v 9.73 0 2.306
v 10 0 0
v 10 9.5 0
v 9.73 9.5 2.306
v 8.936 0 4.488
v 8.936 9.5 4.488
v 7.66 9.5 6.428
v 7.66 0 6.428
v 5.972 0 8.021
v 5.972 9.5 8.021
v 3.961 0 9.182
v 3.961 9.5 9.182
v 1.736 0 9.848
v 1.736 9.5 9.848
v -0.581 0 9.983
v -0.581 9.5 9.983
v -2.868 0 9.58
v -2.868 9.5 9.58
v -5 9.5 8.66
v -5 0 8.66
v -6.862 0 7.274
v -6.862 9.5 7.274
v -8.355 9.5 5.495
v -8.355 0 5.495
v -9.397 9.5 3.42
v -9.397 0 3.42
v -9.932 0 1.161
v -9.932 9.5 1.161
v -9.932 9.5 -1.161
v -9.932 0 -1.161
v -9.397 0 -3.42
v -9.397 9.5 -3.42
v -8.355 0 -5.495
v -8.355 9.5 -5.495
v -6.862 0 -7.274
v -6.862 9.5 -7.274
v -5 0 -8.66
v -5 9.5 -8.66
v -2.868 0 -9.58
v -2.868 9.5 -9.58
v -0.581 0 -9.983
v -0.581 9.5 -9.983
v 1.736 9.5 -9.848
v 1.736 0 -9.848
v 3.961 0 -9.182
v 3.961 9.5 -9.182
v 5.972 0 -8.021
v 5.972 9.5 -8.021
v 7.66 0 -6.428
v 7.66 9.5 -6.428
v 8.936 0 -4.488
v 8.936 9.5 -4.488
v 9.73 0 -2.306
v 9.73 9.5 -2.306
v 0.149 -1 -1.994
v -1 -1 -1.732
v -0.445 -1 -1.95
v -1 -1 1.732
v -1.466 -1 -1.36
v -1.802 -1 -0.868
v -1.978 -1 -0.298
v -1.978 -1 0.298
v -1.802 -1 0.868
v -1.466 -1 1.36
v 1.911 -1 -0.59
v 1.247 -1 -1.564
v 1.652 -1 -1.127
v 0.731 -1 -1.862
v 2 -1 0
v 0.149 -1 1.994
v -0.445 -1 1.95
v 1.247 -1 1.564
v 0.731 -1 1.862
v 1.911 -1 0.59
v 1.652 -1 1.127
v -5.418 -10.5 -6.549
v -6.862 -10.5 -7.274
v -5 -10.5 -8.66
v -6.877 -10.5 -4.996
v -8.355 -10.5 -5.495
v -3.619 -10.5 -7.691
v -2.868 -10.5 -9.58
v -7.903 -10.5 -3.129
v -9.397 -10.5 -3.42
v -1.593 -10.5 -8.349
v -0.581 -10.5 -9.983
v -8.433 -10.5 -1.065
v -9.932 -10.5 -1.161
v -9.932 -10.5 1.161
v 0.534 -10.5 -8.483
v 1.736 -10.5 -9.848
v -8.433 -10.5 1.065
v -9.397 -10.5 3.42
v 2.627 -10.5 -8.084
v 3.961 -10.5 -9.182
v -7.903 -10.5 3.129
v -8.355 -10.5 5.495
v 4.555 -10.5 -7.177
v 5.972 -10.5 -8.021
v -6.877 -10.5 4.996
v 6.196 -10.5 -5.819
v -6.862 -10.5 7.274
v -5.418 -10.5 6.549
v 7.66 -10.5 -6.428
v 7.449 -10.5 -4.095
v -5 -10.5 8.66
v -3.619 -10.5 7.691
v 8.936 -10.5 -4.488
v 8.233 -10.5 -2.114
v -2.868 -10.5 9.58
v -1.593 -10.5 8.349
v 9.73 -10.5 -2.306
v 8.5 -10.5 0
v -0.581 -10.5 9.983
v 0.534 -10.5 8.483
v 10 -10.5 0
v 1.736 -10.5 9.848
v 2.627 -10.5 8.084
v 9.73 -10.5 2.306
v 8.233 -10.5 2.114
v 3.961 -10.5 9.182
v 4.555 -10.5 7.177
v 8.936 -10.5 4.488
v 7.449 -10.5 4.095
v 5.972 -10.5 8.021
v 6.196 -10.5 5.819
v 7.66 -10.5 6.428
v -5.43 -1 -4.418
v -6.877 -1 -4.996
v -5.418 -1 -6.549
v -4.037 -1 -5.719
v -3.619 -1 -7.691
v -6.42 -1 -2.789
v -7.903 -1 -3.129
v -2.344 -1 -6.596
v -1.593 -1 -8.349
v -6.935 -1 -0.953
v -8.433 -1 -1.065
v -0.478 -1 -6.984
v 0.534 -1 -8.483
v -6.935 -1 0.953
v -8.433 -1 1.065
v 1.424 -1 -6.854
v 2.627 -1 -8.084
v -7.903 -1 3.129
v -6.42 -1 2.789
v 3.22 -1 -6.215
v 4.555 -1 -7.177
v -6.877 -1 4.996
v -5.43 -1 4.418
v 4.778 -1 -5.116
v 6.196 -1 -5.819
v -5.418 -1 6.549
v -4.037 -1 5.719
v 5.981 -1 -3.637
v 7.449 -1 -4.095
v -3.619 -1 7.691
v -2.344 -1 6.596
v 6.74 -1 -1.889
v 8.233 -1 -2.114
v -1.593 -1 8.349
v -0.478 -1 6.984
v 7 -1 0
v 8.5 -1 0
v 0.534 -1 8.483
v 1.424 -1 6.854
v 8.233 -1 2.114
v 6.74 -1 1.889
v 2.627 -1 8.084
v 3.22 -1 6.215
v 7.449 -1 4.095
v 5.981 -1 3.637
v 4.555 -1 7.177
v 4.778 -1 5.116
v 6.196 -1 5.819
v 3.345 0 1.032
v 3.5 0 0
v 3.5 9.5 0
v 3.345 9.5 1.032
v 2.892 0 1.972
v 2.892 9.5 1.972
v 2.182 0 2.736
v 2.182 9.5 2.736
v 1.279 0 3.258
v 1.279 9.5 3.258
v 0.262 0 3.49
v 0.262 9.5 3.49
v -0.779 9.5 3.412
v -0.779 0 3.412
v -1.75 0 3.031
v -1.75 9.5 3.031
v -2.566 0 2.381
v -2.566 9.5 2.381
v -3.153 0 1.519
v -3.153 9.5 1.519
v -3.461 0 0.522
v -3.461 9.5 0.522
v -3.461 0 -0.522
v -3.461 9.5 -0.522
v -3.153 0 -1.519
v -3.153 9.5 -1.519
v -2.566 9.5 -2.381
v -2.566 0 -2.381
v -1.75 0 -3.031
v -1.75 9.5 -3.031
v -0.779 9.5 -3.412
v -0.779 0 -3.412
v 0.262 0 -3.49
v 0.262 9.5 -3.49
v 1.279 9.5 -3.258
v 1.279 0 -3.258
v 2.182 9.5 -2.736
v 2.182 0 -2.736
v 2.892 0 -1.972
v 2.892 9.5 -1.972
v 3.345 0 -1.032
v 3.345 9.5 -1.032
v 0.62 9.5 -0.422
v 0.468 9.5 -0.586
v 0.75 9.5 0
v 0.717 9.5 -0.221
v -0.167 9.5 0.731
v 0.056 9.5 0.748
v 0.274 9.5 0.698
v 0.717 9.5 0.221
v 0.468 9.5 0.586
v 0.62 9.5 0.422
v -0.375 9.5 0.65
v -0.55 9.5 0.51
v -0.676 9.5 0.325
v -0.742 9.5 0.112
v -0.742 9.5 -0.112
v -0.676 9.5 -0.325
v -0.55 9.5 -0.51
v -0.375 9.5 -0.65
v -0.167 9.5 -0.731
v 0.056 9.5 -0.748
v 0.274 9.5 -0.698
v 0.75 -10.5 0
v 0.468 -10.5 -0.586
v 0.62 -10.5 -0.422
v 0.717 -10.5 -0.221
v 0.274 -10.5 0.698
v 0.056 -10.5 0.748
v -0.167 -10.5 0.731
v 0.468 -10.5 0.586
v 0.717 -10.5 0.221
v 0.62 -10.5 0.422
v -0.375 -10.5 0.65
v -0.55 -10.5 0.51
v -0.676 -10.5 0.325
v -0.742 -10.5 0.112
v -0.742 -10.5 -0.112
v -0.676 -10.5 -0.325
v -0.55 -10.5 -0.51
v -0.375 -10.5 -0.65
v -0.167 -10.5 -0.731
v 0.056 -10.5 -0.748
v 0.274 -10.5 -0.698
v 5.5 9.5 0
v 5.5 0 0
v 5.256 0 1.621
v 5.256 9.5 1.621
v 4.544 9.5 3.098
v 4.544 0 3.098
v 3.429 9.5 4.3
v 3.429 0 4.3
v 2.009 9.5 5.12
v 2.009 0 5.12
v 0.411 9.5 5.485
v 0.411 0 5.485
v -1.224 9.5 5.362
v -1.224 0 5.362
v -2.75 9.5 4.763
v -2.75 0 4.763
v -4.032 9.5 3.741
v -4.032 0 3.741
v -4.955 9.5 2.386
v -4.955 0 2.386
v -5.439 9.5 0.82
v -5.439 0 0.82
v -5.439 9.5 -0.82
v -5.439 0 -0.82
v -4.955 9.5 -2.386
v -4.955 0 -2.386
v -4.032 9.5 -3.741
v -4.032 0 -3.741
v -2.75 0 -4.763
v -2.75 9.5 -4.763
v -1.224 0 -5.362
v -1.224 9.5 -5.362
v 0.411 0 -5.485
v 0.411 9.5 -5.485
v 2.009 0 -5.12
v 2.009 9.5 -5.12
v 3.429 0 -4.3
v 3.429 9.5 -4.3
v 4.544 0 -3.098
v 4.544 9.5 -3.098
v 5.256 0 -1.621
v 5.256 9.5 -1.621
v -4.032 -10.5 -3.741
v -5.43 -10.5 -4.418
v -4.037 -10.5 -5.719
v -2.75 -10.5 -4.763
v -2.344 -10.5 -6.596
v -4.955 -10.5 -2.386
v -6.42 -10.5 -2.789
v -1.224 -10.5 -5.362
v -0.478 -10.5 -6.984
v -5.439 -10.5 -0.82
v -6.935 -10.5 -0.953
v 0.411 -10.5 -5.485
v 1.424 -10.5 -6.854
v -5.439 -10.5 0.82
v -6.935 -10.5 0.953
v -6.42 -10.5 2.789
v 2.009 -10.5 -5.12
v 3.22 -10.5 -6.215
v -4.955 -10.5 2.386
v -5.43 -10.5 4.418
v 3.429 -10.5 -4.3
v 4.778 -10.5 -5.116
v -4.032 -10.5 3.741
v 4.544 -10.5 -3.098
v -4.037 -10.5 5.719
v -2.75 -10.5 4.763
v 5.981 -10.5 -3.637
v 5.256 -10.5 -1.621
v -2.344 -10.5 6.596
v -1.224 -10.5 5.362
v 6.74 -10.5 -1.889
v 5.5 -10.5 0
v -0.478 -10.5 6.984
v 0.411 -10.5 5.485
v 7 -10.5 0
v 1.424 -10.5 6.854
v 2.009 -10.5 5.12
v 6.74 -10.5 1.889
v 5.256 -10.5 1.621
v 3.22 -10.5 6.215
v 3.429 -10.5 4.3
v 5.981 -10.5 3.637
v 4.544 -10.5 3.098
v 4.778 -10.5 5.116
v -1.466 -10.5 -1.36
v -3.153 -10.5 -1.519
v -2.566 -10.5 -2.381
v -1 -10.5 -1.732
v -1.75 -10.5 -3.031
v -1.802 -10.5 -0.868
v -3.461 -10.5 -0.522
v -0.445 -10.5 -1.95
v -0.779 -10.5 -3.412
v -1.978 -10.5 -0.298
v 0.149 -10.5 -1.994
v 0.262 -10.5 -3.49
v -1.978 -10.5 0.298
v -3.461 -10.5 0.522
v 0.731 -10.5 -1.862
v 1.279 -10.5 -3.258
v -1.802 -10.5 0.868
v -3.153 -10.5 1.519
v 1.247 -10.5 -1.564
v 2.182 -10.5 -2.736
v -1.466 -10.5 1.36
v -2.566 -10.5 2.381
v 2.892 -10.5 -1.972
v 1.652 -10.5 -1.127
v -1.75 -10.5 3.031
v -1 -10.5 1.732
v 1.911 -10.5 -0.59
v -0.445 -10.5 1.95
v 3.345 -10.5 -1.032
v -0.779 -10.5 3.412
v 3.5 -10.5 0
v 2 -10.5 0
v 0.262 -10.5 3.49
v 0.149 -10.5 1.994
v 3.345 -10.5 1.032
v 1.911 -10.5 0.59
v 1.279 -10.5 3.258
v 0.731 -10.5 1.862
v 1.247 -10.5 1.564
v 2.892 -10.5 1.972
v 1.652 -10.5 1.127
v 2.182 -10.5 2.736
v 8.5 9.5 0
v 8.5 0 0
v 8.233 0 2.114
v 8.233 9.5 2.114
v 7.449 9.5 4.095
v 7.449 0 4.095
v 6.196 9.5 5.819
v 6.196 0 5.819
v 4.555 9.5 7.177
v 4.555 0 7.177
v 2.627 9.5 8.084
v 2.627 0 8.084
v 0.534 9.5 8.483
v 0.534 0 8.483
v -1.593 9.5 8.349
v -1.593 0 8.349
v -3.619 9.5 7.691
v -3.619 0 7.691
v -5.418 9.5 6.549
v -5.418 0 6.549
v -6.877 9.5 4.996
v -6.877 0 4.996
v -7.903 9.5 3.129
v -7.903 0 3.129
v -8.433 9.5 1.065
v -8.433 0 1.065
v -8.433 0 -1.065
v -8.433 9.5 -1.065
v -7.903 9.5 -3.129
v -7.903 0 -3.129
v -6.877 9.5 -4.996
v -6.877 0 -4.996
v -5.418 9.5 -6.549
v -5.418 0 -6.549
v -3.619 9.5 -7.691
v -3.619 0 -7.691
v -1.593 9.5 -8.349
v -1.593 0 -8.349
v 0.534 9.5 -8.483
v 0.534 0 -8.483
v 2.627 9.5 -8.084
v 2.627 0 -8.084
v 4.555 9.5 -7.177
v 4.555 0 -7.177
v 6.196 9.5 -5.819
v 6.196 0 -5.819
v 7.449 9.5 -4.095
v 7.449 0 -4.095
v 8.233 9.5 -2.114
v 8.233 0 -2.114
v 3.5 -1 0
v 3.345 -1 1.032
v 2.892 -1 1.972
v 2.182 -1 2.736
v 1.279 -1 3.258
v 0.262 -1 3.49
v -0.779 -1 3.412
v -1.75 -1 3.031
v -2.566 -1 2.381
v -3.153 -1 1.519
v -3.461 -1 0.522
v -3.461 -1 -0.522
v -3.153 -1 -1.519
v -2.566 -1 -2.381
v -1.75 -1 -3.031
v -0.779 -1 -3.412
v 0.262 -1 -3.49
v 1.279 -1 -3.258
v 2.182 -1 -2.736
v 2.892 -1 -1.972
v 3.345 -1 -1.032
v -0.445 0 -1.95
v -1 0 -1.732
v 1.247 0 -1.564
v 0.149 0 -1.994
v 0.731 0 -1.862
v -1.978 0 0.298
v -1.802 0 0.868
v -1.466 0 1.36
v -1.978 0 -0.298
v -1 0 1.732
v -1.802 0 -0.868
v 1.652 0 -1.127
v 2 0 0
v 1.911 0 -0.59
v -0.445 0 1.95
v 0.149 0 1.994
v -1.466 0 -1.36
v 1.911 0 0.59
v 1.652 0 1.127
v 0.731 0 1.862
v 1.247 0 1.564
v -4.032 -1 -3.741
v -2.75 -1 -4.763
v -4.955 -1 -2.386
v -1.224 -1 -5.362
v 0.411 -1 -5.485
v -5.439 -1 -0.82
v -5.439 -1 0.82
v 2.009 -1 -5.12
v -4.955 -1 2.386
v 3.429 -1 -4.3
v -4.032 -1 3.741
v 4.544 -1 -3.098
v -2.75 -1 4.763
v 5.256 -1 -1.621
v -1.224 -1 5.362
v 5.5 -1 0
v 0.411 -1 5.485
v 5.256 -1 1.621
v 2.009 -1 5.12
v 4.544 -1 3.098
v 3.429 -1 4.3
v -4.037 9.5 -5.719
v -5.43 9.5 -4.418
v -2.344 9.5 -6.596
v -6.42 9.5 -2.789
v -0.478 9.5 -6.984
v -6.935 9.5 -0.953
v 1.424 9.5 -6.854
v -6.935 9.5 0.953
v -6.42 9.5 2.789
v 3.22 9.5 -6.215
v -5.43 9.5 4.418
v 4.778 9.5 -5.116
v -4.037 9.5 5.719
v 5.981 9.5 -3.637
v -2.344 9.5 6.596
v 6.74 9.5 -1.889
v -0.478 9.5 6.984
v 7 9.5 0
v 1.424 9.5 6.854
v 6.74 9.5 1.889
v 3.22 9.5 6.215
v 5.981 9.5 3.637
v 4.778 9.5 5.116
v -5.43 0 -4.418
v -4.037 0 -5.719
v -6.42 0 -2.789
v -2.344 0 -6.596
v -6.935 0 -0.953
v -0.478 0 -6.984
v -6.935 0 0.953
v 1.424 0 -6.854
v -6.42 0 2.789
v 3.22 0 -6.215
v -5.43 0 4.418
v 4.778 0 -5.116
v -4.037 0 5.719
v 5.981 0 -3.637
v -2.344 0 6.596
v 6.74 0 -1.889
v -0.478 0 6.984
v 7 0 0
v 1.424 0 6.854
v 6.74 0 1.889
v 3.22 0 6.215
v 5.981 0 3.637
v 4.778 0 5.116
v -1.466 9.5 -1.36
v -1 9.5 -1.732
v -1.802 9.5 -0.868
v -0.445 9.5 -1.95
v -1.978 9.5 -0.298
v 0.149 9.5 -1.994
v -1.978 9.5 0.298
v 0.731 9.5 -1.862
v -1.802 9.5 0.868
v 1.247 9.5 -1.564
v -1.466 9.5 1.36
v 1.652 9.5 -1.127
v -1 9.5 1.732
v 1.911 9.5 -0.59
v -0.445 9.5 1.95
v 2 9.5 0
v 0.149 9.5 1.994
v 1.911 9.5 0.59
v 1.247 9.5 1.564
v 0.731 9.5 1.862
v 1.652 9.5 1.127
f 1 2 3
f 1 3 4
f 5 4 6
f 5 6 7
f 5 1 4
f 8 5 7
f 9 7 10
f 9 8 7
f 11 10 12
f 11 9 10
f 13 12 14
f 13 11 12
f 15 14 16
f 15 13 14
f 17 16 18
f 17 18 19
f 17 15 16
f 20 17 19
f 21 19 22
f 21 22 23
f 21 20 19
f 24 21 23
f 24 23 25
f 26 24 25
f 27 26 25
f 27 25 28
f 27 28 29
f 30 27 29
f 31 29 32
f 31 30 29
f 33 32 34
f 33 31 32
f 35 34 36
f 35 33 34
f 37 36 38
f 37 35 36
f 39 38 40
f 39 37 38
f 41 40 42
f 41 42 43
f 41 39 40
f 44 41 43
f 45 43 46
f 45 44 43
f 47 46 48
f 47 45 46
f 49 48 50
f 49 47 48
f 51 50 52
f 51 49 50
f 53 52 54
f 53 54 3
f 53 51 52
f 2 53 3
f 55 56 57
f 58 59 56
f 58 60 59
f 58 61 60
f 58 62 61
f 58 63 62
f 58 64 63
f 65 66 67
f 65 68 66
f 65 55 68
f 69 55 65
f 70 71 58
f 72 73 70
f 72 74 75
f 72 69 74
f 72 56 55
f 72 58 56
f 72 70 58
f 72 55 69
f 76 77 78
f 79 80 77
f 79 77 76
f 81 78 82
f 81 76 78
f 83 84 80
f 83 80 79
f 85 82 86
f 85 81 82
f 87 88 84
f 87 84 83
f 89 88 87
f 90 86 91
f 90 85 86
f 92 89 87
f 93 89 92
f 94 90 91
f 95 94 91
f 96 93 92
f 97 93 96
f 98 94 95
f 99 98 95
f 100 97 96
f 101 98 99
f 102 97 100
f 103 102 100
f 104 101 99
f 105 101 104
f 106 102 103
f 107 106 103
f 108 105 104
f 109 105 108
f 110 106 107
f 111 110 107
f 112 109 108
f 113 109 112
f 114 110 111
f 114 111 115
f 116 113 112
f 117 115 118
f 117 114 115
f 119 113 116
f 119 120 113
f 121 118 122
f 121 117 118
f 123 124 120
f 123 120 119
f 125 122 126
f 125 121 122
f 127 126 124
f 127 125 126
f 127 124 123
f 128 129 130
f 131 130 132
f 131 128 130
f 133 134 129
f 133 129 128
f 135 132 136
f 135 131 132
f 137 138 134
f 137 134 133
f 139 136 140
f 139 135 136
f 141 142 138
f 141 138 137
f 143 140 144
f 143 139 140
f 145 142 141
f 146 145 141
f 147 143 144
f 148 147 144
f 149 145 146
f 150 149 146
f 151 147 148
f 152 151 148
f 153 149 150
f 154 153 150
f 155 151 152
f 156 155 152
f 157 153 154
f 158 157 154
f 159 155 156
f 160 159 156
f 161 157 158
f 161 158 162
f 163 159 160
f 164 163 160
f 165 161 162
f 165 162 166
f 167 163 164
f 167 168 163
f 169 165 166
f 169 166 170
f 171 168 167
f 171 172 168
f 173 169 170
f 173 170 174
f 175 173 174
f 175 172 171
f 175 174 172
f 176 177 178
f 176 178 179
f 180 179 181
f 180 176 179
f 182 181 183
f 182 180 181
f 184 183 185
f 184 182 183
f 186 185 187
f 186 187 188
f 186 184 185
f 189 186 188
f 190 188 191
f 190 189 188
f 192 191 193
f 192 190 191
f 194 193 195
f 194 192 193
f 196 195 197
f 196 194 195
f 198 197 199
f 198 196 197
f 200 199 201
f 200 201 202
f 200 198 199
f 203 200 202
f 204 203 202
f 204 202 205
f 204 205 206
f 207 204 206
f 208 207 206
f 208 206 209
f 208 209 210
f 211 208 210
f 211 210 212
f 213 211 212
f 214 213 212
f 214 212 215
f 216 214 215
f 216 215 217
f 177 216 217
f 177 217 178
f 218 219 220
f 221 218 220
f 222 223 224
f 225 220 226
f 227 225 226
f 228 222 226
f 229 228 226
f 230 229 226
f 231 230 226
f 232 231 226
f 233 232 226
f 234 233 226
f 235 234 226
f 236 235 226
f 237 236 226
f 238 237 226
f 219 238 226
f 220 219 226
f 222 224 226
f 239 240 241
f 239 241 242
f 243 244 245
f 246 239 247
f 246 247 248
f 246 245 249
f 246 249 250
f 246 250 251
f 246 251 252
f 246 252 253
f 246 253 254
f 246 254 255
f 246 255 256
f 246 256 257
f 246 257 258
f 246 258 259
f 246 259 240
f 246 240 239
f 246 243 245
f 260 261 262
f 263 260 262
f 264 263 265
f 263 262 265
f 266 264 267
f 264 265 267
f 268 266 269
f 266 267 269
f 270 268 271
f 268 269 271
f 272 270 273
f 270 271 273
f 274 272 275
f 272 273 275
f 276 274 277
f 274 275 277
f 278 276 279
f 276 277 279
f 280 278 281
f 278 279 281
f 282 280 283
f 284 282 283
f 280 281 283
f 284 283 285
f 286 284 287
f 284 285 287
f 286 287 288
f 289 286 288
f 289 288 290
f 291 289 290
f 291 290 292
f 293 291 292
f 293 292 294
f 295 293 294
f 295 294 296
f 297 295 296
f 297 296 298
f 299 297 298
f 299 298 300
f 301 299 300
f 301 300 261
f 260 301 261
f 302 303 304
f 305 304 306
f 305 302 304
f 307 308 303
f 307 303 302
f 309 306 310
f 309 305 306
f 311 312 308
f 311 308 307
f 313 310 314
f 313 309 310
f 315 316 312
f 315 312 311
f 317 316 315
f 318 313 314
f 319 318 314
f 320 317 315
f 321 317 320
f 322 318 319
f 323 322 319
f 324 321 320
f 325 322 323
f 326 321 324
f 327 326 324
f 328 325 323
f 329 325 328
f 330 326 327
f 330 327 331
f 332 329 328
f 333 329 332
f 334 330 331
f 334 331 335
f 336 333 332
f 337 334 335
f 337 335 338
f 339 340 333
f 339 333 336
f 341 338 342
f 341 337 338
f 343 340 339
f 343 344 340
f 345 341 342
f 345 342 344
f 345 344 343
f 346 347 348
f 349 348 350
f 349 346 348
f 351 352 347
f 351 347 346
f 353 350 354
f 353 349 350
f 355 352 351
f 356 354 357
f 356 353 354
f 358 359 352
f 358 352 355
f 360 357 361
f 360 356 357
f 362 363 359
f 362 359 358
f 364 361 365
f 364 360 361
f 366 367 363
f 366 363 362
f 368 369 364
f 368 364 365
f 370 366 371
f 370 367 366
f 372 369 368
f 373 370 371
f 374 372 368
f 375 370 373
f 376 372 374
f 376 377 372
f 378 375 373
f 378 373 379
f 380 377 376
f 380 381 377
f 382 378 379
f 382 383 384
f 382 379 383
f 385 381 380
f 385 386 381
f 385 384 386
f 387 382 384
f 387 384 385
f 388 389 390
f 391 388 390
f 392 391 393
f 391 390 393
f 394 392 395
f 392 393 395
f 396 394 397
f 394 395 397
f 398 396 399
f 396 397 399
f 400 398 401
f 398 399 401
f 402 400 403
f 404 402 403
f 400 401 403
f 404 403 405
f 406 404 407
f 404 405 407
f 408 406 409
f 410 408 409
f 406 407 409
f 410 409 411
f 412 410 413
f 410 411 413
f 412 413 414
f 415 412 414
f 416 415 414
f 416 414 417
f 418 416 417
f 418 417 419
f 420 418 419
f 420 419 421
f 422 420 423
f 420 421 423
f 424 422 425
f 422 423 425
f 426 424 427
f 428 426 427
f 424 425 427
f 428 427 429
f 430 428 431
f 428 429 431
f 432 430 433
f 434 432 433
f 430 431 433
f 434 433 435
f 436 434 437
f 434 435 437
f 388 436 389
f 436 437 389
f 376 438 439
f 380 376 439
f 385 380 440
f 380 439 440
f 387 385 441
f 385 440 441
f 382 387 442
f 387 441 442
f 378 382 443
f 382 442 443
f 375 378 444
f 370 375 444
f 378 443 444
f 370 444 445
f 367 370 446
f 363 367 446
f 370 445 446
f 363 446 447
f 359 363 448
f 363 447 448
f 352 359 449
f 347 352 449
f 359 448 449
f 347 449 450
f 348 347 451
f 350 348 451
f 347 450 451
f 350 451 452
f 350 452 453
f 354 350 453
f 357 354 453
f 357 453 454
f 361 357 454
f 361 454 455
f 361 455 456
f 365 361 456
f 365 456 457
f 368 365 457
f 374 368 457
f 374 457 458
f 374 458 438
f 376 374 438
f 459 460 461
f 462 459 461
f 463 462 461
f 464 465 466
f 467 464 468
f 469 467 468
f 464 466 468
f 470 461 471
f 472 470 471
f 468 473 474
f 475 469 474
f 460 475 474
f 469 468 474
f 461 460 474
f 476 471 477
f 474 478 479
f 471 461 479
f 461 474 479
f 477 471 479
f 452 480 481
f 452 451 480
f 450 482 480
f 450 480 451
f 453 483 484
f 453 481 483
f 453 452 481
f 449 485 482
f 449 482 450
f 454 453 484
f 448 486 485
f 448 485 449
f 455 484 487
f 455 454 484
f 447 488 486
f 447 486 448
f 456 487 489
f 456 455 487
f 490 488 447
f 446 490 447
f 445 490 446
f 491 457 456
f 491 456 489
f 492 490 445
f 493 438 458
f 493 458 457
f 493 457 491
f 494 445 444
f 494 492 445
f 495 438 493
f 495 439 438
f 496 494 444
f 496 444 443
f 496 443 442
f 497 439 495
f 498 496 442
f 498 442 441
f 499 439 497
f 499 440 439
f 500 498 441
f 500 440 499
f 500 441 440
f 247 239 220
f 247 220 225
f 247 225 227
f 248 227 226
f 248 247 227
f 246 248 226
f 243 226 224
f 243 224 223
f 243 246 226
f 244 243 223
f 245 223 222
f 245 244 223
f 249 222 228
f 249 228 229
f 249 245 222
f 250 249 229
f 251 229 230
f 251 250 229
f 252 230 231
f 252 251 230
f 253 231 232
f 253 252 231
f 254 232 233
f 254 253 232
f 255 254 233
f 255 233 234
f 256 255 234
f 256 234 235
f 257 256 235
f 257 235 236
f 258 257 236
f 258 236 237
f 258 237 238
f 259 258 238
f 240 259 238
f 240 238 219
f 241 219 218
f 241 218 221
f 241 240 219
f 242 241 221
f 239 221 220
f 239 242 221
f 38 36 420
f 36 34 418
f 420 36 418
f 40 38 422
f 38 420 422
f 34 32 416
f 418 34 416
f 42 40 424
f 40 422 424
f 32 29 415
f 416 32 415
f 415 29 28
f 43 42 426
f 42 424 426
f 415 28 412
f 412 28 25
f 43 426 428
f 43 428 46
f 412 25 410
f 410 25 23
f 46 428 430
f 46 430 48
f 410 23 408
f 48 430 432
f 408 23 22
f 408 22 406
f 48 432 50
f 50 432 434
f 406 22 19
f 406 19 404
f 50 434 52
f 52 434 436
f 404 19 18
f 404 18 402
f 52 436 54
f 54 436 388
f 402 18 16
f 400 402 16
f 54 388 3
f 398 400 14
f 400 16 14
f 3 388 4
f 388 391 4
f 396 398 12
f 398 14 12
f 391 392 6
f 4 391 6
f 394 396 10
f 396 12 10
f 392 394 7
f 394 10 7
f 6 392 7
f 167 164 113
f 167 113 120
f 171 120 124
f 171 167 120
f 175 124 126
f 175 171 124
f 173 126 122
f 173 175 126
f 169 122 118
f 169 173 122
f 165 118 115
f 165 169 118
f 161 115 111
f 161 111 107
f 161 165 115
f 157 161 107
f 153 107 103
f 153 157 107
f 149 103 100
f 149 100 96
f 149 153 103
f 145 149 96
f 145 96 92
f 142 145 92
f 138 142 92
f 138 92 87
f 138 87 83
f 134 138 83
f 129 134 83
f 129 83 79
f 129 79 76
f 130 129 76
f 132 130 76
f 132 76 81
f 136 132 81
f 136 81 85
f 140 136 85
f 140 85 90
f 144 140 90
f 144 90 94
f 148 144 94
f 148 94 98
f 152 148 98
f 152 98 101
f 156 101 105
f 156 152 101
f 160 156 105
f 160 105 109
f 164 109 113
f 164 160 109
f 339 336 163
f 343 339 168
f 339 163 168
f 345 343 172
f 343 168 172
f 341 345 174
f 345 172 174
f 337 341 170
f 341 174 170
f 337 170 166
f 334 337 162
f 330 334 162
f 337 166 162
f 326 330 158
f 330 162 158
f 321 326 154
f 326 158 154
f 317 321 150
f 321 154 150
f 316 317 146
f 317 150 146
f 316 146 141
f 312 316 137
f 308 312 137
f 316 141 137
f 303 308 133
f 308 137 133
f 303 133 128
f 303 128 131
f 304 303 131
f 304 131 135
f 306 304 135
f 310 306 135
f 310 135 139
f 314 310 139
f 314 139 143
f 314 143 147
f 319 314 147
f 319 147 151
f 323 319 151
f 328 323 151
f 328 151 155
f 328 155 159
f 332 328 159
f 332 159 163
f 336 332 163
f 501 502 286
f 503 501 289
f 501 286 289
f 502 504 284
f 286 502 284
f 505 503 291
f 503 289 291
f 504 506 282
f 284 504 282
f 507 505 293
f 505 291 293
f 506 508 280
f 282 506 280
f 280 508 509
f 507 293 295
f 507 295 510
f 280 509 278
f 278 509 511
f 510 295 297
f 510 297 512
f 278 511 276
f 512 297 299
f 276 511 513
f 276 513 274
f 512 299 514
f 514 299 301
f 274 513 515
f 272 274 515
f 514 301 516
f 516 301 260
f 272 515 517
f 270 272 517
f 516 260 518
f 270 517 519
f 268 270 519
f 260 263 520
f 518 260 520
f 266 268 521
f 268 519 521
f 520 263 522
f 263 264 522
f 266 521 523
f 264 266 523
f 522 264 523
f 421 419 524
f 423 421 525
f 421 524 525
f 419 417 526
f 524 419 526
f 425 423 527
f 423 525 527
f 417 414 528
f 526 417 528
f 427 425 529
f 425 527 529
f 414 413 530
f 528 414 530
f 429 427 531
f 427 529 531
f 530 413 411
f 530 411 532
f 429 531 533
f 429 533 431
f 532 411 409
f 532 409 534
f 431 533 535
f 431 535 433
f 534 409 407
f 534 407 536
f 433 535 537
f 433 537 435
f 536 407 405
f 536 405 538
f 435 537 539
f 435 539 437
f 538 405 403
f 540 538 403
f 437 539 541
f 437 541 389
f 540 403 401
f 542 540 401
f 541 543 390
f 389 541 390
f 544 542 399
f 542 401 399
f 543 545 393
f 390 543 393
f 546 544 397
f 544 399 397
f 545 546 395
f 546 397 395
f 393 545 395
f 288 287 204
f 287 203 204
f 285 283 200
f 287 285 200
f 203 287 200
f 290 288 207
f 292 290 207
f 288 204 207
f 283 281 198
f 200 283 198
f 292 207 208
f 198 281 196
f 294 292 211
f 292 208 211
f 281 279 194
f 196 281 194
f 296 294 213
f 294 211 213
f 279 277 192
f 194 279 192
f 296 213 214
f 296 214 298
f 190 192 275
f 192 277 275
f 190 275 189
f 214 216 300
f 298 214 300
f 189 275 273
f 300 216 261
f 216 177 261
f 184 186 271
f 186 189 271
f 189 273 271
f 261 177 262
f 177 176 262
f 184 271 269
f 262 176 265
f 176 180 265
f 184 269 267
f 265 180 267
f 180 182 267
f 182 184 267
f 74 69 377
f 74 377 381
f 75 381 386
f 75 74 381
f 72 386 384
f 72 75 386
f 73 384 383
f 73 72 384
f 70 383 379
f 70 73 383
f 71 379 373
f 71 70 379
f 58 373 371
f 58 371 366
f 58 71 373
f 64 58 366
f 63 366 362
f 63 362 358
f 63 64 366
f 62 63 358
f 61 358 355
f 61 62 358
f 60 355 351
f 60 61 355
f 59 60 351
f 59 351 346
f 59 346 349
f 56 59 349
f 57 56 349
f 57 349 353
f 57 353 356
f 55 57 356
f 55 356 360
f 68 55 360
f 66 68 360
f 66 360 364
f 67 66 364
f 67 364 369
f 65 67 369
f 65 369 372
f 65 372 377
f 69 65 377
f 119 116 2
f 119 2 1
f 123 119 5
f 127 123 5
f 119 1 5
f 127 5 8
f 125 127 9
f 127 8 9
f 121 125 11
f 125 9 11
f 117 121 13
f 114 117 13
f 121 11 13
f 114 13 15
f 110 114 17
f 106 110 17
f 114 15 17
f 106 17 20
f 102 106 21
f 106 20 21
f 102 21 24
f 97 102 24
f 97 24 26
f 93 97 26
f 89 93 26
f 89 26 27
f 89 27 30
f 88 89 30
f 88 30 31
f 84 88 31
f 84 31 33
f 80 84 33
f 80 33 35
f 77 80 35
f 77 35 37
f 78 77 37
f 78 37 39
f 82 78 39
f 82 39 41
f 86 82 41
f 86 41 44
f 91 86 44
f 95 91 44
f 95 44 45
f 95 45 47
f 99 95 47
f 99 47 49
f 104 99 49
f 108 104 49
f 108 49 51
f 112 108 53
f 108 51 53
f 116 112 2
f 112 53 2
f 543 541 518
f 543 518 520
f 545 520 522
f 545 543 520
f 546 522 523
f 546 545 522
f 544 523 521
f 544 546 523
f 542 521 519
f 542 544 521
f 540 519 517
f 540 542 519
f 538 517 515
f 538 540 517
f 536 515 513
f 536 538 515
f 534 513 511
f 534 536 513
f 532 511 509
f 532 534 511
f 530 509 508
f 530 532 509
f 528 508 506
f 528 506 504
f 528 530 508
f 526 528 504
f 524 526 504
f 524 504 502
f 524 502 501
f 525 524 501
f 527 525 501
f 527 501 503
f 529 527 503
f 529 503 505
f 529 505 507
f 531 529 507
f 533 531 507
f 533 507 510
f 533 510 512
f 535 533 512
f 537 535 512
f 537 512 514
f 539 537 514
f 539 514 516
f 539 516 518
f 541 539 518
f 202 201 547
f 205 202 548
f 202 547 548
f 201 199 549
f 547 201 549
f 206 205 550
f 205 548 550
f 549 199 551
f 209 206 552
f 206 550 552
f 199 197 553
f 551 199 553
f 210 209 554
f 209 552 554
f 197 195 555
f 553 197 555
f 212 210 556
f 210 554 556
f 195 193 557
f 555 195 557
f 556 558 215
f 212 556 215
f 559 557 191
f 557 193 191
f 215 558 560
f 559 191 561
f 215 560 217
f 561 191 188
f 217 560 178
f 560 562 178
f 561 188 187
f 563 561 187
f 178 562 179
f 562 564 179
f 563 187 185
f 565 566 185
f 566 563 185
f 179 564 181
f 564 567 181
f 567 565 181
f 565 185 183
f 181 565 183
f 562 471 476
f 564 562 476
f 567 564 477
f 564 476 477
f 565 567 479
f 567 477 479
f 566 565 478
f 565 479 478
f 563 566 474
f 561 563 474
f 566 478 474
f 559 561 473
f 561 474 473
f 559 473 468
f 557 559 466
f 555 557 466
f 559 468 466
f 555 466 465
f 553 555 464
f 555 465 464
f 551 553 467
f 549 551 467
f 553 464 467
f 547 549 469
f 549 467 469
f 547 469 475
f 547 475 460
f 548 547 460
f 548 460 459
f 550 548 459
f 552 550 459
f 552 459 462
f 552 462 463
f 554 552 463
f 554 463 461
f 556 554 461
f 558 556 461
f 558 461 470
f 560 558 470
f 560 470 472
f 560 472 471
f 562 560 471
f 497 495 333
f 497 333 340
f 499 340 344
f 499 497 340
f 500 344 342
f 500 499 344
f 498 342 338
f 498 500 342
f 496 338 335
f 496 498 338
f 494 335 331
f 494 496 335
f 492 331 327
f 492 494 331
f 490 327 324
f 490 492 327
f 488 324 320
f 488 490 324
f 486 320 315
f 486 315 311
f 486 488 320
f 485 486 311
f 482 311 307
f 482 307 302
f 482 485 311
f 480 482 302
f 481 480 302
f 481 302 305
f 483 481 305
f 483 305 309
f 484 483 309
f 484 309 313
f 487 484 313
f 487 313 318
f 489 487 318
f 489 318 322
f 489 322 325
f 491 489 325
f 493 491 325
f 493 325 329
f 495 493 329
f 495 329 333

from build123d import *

# Parameters (mm, degrees)
F1_R     = 10
F2_DEPTH = 1
F0_R     = 10
F0_R_2   = 8.5
F0_R_3   = 7
F0_R_4   = 5.5
F0_R_5   = 3.5
F0_R_6   = 2
F3_DEPTH = 10.5
F4_DEPTH = 9.5
F5_DEPTH = 20
F6_R     = 0.75
F7_DEPTH = 20


with BuildPart() as f2:
    # F1 (on face) → F2 (new body)
    with BuildSketch(Plane.XZ):
        Circle(F1_R)
    extrude(amount=F2_DEPTH)

    # F0 (on Front) → F3 (join)
    with BuildSketch(Plane.XZ):
        Circle(F0_R)
        Circle(F0_R_2, mode=Mode.SUBTRACT)
        Circle(F0_R_3)
        Circle(F0_R_4, mode=Mode.SUBTRACT)
        Circle(F0_R_5)
        Circle(F0_R_6, mode=Mode.SUBTRACT)
    extrude(amount=F3_DEPTH)

    # F0 (on Front) → F4 (join)
    with BuildSketch(Plane.XZ):
        Circle(F0_R)
        Circle(F0_R_2, mode=Mode.SUBTRACT)
    extrude(amount=-F4_DEPTH)

    # F5 (add): faces of the model
    f5_faces = [f2.faces().sort_by_distance(p)[0] for p in [
        (-3.4010050506, -10.5, 0),
        (-6.8020101013, -10.5, 0),
        (-9.7171572875, -10.5, 0),
    ]]
    extrude(f5_faces, amount=-F5_DEPTH)


with BuildPart() as f7:
    # F6 (on face) → F7 (new body)
    with BuildSketch(Plane.XZ.offset(10.5)):
        Circle(F6_R)
    extrude(amount=-F7_DEPTH)


solid = Compound([f2.part, f7.part])
